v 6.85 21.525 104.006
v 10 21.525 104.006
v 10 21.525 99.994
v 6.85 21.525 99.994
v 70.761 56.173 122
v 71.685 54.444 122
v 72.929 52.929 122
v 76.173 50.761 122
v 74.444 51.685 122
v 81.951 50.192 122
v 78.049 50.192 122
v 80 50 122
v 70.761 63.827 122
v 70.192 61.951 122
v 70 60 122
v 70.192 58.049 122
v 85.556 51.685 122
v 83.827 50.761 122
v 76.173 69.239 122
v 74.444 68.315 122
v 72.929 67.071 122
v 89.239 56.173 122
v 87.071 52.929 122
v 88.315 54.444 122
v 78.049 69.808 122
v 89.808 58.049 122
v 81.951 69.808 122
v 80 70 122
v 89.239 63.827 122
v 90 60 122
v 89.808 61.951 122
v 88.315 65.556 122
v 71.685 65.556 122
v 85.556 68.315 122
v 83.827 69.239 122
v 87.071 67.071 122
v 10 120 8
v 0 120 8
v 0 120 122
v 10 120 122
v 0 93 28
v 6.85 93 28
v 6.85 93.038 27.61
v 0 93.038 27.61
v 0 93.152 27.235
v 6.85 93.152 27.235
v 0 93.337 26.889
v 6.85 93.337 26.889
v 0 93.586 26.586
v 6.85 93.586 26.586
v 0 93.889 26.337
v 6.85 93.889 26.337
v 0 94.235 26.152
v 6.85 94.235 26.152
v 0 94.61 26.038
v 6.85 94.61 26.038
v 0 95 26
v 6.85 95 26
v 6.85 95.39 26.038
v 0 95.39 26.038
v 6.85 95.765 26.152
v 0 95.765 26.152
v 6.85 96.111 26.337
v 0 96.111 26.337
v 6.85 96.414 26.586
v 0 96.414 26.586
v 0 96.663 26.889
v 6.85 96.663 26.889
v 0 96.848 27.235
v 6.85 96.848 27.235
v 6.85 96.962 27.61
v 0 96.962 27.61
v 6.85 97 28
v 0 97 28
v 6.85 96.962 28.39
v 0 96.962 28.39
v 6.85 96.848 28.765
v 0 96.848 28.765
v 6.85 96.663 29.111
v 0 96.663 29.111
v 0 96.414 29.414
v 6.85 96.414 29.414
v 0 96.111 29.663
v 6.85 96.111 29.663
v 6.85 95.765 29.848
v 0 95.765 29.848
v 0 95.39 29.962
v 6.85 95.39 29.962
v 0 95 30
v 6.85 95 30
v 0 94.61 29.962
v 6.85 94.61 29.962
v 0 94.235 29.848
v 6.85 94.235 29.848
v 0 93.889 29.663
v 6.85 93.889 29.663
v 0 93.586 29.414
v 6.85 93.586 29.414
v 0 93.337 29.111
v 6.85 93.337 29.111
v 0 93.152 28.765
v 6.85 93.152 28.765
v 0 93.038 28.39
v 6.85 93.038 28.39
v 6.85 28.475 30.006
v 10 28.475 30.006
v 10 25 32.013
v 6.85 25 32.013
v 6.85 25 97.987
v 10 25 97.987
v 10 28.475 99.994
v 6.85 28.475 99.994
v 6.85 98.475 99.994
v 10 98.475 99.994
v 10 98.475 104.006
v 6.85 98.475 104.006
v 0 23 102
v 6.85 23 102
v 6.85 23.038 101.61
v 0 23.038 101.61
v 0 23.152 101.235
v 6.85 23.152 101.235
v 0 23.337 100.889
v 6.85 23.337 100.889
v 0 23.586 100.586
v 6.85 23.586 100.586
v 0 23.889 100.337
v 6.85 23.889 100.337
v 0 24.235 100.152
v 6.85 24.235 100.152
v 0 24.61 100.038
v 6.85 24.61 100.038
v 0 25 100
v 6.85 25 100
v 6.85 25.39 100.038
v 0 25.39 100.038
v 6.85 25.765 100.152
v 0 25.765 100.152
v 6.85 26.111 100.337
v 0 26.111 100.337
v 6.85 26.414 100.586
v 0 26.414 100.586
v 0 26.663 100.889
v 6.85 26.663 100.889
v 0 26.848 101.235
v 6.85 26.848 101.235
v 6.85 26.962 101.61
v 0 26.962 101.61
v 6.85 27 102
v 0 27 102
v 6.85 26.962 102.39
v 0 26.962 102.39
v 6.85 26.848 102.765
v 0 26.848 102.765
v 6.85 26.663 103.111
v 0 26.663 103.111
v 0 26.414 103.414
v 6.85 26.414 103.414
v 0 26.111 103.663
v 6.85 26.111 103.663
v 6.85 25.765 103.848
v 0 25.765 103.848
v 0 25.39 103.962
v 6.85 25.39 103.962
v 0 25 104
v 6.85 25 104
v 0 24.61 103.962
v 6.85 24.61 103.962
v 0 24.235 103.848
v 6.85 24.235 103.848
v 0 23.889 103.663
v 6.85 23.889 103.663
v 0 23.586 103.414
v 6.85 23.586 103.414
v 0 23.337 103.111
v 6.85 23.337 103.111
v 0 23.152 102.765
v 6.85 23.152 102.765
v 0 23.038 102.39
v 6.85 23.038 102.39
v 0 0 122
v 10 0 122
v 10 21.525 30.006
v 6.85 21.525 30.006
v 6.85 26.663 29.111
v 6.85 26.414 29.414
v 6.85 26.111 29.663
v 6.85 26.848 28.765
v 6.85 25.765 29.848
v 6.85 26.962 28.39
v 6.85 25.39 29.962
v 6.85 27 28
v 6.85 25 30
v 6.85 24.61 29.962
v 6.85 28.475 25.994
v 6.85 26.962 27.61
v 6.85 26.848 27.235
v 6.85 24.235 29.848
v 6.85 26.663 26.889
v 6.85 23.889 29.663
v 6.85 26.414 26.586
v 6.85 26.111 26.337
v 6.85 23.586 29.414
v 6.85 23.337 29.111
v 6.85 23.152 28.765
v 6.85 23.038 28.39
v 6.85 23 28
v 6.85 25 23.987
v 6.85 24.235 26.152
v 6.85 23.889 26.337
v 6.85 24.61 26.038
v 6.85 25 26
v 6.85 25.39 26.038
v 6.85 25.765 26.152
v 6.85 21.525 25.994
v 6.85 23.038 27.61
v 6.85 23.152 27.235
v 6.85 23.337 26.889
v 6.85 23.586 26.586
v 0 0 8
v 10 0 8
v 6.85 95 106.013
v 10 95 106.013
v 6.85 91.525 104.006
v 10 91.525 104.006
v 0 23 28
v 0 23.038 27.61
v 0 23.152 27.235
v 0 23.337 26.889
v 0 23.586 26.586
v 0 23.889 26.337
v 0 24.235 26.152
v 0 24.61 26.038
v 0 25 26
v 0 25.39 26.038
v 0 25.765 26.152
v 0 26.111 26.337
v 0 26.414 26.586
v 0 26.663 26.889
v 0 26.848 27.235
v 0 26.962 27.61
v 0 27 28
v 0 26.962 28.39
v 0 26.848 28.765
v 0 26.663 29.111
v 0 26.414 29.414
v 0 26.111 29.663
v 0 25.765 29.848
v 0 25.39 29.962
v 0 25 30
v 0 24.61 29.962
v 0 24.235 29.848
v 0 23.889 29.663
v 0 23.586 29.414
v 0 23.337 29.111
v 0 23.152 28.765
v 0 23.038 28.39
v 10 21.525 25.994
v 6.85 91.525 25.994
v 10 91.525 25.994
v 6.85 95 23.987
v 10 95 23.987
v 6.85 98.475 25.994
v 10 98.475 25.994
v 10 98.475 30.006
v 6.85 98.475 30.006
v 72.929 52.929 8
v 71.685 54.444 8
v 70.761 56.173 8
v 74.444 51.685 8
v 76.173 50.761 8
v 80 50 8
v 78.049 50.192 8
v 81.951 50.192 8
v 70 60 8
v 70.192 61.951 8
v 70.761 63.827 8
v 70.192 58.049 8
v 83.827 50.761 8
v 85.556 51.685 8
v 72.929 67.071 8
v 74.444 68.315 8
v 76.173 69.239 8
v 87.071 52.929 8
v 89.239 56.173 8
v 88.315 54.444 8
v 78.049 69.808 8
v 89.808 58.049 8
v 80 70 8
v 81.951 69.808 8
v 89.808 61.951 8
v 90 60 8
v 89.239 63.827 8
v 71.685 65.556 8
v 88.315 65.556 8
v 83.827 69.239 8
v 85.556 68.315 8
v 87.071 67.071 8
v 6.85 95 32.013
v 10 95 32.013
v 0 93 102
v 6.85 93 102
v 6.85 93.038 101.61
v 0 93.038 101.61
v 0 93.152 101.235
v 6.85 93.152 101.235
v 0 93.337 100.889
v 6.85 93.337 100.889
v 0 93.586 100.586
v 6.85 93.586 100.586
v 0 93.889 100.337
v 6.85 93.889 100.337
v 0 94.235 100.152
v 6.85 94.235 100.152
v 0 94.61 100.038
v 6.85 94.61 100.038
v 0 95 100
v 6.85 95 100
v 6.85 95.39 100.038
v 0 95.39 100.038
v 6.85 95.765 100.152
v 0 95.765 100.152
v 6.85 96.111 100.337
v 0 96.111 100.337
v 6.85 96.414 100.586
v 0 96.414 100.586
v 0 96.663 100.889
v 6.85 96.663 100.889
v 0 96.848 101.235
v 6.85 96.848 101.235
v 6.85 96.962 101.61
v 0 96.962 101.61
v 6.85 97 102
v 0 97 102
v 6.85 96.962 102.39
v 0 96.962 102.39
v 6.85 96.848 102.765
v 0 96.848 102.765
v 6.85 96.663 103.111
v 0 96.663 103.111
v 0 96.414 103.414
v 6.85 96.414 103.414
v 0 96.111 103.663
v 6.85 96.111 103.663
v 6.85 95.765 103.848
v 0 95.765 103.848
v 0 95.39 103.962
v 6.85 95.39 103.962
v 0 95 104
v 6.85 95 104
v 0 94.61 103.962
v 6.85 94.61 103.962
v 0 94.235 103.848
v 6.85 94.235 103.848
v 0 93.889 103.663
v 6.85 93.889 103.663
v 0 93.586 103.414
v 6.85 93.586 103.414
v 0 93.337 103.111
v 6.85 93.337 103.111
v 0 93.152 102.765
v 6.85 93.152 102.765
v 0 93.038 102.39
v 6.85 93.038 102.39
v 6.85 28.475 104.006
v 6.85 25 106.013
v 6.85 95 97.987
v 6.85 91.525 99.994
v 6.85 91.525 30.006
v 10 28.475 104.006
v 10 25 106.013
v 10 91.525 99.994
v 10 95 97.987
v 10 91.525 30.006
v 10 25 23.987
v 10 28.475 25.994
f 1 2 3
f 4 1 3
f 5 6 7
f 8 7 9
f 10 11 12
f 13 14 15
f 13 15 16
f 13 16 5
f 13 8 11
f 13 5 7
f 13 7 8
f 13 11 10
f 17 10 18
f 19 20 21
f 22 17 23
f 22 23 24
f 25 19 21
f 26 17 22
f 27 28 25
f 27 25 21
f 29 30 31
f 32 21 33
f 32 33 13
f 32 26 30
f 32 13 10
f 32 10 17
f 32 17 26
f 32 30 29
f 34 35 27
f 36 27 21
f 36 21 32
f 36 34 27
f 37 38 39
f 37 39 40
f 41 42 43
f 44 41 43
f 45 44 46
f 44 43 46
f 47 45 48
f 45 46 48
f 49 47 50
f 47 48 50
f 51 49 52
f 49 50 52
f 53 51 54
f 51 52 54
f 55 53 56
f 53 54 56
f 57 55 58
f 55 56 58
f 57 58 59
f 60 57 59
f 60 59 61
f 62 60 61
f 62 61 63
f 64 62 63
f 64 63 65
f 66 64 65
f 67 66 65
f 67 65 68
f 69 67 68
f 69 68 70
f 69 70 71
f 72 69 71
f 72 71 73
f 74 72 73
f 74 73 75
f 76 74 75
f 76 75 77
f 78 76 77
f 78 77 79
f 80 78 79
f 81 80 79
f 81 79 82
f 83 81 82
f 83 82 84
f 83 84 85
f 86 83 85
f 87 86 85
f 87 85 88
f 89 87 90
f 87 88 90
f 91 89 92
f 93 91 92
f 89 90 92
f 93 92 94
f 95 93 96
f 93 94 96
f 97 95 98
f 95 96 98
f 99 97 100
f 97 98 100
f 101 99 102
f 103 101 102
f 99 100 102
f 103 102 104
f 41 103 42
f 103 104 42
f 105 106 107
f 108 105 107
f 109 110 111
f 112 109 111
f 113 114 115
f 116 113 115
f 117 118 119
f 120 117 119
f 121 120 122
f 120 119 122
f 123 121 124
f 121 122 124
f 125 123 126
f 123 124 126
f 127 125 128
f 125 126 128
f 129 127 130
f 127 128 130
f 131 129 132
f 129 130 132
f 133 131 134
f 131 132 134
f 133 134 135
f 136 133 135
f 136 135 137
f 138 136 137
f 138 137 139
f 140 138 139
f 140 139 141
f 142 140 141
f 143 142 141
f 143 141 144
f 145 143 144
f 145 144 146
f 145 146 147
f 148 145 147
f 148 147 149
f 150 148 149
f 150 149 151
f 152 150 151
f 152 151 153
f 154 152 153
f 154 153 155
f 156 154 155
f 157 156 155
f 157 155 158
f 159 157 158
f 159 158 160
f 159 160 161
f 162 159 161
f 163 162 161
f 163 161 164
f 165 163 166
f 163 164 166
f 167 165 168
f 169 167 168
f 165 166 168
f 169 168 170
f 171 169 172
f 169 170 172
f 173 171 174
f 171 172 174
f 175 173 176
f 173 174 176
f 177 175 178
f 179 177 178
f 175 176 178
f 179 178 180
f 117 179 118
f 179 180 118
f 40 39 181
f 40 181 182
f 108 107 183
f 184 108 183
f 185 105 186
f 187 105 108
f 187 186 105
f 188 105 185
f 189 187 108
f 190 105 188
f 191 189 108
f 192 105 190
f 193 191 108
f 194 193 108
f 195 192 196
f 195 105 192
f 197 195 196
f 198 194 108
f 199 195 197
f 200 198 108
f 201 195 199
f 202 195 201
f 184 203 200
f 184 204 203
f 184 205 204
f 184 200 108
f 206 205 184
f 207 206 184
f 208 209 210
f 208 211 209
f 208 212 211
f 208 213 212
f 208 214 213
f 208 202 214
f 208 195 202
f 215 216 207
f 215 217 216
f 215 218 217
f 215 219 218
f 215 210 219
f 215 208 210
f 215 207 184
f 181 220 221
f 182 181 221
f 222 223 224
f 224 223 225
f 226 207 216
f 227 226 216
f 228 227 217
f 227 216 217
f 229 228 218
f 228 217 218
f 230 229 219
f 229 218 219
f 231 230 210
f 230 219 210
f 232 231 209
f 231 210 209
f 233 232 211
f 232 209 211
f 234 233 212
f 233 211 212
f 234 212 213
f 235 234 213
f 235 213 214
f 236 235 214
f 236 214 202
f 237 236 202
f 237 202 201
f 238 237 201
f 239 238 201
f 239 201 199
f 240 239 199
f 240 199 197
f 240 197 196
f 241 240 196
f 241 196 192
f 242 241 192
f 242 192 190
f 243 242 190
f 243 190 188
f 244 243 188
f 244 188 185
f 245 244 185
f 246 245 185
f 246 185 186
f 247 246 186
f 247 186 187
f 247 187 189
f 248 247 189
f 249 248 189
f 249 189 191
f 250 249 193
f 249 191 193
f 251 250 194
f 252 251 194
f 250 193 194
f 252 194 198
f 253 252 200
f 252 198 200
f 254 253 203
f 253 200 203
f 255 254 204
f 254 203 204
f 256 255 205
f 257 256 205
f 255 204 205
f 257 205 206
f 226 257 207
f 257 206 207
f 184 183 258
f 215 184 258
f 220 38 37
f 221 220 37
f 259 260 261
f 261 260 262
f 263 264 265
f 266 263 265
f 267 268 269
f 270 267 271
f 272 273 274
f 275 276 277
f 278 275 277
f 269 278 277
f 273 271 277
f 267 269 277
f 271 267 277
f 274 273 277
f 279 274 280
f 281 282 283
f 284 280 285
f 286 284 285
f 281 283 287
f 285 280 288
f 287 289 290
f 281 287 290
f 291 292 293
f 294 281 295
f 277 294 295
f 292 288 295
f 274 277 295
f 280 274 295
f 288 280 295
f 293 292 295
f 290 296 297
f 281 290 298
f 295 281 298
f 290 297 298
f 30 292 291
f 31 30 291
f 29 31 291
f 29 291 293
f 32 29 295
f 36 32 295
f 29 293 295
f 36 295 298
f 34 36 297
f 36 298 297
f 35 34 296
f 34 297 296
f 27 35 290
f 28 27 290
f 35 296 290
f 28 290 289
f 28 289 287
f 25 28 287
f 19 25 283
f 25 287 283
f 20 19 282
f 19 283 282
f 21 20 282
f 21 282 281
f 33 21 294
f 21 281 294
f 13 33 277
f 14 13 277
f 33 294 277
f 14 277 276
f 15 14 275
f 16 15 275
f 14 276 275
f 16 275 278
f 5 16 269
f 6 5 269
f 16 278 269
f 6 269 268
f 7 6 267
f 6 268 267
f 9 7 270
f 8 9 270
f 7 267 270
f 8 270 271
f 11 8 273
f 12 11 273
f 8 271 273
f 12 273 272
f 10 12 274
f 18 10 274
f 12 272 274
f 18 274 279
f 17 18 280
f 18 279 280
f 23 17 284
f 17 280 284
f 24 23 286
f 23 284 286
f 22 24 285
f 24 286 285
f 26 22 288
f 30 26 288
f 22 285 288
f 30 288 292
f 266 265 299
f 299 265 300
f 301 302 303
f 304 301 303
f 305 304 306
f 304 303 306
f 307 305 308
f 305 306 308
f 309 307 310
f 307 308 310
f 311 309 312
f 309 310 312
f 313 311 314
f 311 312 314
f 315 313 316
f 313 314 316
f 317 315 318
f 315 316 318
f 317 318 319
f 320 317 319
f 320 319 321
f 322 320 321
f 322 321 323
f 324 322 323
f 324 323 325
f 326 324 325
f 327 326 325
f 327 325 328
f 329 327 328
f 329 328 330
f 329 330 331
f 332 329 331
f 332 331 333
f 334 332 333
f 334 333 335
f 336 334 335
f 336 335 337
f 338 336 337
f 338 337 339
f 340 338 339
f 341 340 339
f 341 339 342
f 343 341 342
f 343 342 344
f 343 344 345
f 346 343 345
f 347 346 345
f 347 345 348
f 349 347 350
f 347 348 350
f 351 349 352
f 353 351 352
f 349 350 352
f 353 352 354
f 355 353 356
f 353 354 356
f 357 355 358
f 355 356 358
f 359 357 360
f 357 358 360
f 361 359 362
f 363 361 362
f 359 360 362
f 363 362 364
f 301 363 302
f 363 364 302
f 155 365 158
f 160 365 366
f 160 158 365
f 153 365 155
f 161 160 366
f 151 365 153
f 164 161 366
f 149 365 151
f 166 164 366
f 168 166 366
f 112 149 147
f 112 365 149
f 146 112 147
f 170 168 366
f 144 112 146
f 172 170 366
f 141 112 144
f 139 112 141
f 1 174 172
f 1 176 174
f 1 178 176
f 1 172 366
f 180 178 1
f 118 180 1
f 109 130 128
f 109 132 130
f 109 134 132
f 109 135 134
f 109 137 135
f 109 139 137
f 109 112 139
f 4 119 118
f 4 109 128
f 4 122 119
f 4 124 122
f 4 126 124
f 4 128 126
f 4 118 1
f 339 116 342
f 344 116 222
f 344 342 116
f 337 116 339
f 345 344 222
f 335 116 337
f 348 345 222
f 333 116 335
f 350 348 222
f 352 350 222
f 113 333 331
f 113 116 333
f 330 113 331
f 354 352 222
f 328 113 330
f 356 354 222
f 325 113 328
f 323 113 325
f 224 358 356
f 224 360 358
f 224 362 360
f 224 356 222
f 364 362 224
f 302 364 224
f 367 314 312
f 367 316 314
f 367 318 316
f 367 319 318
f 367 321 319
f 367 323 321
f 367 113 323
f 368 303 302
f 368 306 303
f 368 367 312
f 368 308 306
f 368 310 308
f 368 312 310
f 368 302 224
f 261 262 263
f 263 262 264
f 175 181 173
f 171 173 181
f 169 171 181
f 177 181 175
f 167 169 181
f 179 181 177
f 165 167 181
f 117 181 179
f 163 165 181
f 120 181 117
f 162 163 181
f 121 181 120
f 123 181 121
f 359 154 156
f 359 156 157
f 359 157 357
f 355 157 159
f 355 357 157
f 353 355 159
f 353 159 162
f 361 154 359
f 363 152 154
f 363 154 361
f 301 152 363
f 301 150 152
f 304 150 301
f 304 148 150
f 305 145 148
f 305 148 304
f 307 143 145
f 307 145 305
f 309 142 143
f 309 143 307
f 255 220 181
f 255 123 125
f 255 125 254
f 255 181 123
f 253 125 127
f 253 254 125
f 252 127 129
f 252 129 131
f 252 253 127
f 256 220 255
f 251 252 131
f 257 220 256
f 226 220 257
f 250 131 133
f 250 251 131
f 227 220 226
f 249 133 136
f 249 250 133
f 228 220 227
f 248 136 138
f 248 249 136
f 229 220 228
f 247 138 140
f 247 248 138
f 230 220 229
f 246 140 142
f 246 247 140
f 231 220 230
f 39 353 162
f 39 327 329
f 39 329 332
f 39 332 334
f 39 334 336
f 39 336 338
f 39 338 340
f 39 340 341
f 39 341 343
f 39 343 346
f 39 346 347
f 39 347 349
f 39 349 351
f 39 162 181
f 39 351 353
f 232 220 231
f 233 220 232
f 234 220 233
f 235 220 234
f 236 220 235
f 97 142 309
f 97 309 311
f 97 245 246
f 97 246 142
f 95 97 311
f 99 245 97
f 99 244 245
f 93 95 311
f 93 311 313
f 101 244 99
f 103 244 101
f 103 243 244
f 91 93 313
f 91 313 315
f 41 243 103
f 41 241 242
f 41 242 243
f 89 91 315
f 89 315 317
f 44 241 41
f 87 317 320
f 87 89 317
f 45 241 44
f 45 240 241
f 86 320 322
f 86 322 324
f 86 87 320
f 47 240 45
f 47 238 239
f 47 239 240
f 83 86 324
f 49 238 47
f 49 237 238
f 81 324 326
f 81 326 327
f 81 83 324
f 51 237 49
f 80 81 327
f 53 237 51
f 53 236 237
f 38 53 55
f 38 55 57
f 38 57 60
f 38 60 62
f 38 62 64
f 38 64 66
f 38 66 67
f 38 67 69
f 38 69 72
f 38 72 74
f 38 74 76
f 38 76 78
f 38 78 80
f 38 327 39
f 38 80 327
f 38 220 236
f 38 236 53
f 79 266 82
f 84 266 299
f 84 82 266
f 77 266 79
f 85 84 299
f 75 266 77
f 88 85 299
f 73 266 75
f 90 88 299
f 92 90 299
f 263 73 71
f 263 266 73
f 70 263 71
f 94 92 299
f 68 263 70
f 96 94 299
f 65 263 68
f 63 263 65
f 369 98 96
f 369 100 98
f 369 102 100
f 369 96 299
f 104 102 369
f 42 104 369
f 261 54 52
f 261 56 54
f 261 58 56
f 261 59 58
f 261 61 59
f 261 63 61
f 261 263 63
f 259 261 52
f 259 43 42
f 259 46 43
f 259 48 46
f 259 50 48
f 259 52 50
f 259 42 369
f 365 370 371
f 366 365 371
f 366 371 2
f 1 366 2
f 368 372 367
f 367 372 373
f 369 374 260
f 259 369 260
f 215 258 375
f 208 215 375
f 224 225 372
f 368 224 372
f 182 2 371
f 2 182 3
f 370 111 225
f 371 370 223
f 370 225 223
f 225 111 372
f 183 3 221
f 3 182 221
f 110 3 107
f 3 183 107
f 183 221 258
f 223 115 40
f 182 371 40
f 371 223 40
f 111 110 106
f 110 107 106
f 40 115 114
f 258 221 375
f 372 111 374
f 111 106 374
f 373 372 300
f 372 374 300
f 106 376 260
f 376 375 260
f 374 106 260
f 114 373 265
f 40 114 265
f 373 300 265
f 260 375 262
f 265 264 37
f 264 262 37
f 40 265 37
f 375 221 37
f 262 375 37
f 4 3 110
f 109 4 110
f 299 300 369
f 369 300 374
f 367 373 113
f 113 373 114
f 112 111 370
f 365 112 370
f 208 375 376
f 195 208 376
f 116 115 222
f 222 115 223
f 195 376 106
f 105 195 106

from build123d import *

# Parameters (mm, degrees)
EXTRUDE004_DEPTH = 3.15
FACE003_R        = 2
EXTRUDE003_DEPTH = 10
SKETCH001_R      = 10
SKETCH001_W      = 10
SKETCH001_H      = 120
EXTRUDE001_DEPTH = 114


with BuildPart() as extrude004:
    # Face004 → Extrude004 (new body)
    with BuildSketch(Plane(origin=(10, 95, 28), x_dir=(0, -1, 0), z_dir=(1, 0, 0))):
        Polygon((-3.475, -2.006292), (0, -4.012584), (3.475, -2.006292), (3.475, 2.006292), (0, 4.012584), (-3.475, 2.006292), align=None)
        Polygon((66.525, -2.006292), (70, -4.012584), (73.475, -2.006292), (73.475, 2.006292), (70, 4.012584), (66.525, 2.006292), align=None)
        Polygon((66.525, -76.006292), (70, -78.012584), (73.475, -76.006292), (73.475, -71.993708), (70, -69.987416), (66.525, -71.993708), align=None)
        Polygon((-3.475, -76.006292), (0, -78.012584), (3.475, -76.006292), (3.475, -71.993708), (0, -69.987416), (-3.475, -71.993708), align=None)
    extrude(amount=-EXTRUDE004_DEPTH)


with BuildPart() as extrude003:
    # Face003 → Extrude003 (new body)
    with BuildSketch(Plane(origin=(10, 95, 102), x_dir=(0, -1, 0), z_dir=(1, 0, 0))):
        Circle(FACE003_R)
        with Locations((70, 0)):
            Circle(FACE003_R)
        with Locations((70, 74)):
            Circle(FACE003_R)
        with Locations((0, 74)):
            Circle(FACE003_R)
    extrude(amount=-EXTRUDE003_DEPTH)


with BuildPart() as cut001:
    # Sketch001 (on Face12 of Extrude) → Extrude001 (new body)
    with BuildSketch(Plane.XY.offset(8)):
        with Locations((80, 60)):
            Circle(SKETCH001_R)
        with Locations((5, 60)):
            Rectangle(SKETCH001_W, SKETCH001_H)
    extrude(amount=EXTRUDE001_DEPTH)

    # Cut: cut Extrude003
    add(extrude003.part, mode=Mode.SUBTRACT)

    # Cut001: cut Extrude004
    add(extrude004.part, mode=Mode.SUBTRACT)


solid = cut001.part
